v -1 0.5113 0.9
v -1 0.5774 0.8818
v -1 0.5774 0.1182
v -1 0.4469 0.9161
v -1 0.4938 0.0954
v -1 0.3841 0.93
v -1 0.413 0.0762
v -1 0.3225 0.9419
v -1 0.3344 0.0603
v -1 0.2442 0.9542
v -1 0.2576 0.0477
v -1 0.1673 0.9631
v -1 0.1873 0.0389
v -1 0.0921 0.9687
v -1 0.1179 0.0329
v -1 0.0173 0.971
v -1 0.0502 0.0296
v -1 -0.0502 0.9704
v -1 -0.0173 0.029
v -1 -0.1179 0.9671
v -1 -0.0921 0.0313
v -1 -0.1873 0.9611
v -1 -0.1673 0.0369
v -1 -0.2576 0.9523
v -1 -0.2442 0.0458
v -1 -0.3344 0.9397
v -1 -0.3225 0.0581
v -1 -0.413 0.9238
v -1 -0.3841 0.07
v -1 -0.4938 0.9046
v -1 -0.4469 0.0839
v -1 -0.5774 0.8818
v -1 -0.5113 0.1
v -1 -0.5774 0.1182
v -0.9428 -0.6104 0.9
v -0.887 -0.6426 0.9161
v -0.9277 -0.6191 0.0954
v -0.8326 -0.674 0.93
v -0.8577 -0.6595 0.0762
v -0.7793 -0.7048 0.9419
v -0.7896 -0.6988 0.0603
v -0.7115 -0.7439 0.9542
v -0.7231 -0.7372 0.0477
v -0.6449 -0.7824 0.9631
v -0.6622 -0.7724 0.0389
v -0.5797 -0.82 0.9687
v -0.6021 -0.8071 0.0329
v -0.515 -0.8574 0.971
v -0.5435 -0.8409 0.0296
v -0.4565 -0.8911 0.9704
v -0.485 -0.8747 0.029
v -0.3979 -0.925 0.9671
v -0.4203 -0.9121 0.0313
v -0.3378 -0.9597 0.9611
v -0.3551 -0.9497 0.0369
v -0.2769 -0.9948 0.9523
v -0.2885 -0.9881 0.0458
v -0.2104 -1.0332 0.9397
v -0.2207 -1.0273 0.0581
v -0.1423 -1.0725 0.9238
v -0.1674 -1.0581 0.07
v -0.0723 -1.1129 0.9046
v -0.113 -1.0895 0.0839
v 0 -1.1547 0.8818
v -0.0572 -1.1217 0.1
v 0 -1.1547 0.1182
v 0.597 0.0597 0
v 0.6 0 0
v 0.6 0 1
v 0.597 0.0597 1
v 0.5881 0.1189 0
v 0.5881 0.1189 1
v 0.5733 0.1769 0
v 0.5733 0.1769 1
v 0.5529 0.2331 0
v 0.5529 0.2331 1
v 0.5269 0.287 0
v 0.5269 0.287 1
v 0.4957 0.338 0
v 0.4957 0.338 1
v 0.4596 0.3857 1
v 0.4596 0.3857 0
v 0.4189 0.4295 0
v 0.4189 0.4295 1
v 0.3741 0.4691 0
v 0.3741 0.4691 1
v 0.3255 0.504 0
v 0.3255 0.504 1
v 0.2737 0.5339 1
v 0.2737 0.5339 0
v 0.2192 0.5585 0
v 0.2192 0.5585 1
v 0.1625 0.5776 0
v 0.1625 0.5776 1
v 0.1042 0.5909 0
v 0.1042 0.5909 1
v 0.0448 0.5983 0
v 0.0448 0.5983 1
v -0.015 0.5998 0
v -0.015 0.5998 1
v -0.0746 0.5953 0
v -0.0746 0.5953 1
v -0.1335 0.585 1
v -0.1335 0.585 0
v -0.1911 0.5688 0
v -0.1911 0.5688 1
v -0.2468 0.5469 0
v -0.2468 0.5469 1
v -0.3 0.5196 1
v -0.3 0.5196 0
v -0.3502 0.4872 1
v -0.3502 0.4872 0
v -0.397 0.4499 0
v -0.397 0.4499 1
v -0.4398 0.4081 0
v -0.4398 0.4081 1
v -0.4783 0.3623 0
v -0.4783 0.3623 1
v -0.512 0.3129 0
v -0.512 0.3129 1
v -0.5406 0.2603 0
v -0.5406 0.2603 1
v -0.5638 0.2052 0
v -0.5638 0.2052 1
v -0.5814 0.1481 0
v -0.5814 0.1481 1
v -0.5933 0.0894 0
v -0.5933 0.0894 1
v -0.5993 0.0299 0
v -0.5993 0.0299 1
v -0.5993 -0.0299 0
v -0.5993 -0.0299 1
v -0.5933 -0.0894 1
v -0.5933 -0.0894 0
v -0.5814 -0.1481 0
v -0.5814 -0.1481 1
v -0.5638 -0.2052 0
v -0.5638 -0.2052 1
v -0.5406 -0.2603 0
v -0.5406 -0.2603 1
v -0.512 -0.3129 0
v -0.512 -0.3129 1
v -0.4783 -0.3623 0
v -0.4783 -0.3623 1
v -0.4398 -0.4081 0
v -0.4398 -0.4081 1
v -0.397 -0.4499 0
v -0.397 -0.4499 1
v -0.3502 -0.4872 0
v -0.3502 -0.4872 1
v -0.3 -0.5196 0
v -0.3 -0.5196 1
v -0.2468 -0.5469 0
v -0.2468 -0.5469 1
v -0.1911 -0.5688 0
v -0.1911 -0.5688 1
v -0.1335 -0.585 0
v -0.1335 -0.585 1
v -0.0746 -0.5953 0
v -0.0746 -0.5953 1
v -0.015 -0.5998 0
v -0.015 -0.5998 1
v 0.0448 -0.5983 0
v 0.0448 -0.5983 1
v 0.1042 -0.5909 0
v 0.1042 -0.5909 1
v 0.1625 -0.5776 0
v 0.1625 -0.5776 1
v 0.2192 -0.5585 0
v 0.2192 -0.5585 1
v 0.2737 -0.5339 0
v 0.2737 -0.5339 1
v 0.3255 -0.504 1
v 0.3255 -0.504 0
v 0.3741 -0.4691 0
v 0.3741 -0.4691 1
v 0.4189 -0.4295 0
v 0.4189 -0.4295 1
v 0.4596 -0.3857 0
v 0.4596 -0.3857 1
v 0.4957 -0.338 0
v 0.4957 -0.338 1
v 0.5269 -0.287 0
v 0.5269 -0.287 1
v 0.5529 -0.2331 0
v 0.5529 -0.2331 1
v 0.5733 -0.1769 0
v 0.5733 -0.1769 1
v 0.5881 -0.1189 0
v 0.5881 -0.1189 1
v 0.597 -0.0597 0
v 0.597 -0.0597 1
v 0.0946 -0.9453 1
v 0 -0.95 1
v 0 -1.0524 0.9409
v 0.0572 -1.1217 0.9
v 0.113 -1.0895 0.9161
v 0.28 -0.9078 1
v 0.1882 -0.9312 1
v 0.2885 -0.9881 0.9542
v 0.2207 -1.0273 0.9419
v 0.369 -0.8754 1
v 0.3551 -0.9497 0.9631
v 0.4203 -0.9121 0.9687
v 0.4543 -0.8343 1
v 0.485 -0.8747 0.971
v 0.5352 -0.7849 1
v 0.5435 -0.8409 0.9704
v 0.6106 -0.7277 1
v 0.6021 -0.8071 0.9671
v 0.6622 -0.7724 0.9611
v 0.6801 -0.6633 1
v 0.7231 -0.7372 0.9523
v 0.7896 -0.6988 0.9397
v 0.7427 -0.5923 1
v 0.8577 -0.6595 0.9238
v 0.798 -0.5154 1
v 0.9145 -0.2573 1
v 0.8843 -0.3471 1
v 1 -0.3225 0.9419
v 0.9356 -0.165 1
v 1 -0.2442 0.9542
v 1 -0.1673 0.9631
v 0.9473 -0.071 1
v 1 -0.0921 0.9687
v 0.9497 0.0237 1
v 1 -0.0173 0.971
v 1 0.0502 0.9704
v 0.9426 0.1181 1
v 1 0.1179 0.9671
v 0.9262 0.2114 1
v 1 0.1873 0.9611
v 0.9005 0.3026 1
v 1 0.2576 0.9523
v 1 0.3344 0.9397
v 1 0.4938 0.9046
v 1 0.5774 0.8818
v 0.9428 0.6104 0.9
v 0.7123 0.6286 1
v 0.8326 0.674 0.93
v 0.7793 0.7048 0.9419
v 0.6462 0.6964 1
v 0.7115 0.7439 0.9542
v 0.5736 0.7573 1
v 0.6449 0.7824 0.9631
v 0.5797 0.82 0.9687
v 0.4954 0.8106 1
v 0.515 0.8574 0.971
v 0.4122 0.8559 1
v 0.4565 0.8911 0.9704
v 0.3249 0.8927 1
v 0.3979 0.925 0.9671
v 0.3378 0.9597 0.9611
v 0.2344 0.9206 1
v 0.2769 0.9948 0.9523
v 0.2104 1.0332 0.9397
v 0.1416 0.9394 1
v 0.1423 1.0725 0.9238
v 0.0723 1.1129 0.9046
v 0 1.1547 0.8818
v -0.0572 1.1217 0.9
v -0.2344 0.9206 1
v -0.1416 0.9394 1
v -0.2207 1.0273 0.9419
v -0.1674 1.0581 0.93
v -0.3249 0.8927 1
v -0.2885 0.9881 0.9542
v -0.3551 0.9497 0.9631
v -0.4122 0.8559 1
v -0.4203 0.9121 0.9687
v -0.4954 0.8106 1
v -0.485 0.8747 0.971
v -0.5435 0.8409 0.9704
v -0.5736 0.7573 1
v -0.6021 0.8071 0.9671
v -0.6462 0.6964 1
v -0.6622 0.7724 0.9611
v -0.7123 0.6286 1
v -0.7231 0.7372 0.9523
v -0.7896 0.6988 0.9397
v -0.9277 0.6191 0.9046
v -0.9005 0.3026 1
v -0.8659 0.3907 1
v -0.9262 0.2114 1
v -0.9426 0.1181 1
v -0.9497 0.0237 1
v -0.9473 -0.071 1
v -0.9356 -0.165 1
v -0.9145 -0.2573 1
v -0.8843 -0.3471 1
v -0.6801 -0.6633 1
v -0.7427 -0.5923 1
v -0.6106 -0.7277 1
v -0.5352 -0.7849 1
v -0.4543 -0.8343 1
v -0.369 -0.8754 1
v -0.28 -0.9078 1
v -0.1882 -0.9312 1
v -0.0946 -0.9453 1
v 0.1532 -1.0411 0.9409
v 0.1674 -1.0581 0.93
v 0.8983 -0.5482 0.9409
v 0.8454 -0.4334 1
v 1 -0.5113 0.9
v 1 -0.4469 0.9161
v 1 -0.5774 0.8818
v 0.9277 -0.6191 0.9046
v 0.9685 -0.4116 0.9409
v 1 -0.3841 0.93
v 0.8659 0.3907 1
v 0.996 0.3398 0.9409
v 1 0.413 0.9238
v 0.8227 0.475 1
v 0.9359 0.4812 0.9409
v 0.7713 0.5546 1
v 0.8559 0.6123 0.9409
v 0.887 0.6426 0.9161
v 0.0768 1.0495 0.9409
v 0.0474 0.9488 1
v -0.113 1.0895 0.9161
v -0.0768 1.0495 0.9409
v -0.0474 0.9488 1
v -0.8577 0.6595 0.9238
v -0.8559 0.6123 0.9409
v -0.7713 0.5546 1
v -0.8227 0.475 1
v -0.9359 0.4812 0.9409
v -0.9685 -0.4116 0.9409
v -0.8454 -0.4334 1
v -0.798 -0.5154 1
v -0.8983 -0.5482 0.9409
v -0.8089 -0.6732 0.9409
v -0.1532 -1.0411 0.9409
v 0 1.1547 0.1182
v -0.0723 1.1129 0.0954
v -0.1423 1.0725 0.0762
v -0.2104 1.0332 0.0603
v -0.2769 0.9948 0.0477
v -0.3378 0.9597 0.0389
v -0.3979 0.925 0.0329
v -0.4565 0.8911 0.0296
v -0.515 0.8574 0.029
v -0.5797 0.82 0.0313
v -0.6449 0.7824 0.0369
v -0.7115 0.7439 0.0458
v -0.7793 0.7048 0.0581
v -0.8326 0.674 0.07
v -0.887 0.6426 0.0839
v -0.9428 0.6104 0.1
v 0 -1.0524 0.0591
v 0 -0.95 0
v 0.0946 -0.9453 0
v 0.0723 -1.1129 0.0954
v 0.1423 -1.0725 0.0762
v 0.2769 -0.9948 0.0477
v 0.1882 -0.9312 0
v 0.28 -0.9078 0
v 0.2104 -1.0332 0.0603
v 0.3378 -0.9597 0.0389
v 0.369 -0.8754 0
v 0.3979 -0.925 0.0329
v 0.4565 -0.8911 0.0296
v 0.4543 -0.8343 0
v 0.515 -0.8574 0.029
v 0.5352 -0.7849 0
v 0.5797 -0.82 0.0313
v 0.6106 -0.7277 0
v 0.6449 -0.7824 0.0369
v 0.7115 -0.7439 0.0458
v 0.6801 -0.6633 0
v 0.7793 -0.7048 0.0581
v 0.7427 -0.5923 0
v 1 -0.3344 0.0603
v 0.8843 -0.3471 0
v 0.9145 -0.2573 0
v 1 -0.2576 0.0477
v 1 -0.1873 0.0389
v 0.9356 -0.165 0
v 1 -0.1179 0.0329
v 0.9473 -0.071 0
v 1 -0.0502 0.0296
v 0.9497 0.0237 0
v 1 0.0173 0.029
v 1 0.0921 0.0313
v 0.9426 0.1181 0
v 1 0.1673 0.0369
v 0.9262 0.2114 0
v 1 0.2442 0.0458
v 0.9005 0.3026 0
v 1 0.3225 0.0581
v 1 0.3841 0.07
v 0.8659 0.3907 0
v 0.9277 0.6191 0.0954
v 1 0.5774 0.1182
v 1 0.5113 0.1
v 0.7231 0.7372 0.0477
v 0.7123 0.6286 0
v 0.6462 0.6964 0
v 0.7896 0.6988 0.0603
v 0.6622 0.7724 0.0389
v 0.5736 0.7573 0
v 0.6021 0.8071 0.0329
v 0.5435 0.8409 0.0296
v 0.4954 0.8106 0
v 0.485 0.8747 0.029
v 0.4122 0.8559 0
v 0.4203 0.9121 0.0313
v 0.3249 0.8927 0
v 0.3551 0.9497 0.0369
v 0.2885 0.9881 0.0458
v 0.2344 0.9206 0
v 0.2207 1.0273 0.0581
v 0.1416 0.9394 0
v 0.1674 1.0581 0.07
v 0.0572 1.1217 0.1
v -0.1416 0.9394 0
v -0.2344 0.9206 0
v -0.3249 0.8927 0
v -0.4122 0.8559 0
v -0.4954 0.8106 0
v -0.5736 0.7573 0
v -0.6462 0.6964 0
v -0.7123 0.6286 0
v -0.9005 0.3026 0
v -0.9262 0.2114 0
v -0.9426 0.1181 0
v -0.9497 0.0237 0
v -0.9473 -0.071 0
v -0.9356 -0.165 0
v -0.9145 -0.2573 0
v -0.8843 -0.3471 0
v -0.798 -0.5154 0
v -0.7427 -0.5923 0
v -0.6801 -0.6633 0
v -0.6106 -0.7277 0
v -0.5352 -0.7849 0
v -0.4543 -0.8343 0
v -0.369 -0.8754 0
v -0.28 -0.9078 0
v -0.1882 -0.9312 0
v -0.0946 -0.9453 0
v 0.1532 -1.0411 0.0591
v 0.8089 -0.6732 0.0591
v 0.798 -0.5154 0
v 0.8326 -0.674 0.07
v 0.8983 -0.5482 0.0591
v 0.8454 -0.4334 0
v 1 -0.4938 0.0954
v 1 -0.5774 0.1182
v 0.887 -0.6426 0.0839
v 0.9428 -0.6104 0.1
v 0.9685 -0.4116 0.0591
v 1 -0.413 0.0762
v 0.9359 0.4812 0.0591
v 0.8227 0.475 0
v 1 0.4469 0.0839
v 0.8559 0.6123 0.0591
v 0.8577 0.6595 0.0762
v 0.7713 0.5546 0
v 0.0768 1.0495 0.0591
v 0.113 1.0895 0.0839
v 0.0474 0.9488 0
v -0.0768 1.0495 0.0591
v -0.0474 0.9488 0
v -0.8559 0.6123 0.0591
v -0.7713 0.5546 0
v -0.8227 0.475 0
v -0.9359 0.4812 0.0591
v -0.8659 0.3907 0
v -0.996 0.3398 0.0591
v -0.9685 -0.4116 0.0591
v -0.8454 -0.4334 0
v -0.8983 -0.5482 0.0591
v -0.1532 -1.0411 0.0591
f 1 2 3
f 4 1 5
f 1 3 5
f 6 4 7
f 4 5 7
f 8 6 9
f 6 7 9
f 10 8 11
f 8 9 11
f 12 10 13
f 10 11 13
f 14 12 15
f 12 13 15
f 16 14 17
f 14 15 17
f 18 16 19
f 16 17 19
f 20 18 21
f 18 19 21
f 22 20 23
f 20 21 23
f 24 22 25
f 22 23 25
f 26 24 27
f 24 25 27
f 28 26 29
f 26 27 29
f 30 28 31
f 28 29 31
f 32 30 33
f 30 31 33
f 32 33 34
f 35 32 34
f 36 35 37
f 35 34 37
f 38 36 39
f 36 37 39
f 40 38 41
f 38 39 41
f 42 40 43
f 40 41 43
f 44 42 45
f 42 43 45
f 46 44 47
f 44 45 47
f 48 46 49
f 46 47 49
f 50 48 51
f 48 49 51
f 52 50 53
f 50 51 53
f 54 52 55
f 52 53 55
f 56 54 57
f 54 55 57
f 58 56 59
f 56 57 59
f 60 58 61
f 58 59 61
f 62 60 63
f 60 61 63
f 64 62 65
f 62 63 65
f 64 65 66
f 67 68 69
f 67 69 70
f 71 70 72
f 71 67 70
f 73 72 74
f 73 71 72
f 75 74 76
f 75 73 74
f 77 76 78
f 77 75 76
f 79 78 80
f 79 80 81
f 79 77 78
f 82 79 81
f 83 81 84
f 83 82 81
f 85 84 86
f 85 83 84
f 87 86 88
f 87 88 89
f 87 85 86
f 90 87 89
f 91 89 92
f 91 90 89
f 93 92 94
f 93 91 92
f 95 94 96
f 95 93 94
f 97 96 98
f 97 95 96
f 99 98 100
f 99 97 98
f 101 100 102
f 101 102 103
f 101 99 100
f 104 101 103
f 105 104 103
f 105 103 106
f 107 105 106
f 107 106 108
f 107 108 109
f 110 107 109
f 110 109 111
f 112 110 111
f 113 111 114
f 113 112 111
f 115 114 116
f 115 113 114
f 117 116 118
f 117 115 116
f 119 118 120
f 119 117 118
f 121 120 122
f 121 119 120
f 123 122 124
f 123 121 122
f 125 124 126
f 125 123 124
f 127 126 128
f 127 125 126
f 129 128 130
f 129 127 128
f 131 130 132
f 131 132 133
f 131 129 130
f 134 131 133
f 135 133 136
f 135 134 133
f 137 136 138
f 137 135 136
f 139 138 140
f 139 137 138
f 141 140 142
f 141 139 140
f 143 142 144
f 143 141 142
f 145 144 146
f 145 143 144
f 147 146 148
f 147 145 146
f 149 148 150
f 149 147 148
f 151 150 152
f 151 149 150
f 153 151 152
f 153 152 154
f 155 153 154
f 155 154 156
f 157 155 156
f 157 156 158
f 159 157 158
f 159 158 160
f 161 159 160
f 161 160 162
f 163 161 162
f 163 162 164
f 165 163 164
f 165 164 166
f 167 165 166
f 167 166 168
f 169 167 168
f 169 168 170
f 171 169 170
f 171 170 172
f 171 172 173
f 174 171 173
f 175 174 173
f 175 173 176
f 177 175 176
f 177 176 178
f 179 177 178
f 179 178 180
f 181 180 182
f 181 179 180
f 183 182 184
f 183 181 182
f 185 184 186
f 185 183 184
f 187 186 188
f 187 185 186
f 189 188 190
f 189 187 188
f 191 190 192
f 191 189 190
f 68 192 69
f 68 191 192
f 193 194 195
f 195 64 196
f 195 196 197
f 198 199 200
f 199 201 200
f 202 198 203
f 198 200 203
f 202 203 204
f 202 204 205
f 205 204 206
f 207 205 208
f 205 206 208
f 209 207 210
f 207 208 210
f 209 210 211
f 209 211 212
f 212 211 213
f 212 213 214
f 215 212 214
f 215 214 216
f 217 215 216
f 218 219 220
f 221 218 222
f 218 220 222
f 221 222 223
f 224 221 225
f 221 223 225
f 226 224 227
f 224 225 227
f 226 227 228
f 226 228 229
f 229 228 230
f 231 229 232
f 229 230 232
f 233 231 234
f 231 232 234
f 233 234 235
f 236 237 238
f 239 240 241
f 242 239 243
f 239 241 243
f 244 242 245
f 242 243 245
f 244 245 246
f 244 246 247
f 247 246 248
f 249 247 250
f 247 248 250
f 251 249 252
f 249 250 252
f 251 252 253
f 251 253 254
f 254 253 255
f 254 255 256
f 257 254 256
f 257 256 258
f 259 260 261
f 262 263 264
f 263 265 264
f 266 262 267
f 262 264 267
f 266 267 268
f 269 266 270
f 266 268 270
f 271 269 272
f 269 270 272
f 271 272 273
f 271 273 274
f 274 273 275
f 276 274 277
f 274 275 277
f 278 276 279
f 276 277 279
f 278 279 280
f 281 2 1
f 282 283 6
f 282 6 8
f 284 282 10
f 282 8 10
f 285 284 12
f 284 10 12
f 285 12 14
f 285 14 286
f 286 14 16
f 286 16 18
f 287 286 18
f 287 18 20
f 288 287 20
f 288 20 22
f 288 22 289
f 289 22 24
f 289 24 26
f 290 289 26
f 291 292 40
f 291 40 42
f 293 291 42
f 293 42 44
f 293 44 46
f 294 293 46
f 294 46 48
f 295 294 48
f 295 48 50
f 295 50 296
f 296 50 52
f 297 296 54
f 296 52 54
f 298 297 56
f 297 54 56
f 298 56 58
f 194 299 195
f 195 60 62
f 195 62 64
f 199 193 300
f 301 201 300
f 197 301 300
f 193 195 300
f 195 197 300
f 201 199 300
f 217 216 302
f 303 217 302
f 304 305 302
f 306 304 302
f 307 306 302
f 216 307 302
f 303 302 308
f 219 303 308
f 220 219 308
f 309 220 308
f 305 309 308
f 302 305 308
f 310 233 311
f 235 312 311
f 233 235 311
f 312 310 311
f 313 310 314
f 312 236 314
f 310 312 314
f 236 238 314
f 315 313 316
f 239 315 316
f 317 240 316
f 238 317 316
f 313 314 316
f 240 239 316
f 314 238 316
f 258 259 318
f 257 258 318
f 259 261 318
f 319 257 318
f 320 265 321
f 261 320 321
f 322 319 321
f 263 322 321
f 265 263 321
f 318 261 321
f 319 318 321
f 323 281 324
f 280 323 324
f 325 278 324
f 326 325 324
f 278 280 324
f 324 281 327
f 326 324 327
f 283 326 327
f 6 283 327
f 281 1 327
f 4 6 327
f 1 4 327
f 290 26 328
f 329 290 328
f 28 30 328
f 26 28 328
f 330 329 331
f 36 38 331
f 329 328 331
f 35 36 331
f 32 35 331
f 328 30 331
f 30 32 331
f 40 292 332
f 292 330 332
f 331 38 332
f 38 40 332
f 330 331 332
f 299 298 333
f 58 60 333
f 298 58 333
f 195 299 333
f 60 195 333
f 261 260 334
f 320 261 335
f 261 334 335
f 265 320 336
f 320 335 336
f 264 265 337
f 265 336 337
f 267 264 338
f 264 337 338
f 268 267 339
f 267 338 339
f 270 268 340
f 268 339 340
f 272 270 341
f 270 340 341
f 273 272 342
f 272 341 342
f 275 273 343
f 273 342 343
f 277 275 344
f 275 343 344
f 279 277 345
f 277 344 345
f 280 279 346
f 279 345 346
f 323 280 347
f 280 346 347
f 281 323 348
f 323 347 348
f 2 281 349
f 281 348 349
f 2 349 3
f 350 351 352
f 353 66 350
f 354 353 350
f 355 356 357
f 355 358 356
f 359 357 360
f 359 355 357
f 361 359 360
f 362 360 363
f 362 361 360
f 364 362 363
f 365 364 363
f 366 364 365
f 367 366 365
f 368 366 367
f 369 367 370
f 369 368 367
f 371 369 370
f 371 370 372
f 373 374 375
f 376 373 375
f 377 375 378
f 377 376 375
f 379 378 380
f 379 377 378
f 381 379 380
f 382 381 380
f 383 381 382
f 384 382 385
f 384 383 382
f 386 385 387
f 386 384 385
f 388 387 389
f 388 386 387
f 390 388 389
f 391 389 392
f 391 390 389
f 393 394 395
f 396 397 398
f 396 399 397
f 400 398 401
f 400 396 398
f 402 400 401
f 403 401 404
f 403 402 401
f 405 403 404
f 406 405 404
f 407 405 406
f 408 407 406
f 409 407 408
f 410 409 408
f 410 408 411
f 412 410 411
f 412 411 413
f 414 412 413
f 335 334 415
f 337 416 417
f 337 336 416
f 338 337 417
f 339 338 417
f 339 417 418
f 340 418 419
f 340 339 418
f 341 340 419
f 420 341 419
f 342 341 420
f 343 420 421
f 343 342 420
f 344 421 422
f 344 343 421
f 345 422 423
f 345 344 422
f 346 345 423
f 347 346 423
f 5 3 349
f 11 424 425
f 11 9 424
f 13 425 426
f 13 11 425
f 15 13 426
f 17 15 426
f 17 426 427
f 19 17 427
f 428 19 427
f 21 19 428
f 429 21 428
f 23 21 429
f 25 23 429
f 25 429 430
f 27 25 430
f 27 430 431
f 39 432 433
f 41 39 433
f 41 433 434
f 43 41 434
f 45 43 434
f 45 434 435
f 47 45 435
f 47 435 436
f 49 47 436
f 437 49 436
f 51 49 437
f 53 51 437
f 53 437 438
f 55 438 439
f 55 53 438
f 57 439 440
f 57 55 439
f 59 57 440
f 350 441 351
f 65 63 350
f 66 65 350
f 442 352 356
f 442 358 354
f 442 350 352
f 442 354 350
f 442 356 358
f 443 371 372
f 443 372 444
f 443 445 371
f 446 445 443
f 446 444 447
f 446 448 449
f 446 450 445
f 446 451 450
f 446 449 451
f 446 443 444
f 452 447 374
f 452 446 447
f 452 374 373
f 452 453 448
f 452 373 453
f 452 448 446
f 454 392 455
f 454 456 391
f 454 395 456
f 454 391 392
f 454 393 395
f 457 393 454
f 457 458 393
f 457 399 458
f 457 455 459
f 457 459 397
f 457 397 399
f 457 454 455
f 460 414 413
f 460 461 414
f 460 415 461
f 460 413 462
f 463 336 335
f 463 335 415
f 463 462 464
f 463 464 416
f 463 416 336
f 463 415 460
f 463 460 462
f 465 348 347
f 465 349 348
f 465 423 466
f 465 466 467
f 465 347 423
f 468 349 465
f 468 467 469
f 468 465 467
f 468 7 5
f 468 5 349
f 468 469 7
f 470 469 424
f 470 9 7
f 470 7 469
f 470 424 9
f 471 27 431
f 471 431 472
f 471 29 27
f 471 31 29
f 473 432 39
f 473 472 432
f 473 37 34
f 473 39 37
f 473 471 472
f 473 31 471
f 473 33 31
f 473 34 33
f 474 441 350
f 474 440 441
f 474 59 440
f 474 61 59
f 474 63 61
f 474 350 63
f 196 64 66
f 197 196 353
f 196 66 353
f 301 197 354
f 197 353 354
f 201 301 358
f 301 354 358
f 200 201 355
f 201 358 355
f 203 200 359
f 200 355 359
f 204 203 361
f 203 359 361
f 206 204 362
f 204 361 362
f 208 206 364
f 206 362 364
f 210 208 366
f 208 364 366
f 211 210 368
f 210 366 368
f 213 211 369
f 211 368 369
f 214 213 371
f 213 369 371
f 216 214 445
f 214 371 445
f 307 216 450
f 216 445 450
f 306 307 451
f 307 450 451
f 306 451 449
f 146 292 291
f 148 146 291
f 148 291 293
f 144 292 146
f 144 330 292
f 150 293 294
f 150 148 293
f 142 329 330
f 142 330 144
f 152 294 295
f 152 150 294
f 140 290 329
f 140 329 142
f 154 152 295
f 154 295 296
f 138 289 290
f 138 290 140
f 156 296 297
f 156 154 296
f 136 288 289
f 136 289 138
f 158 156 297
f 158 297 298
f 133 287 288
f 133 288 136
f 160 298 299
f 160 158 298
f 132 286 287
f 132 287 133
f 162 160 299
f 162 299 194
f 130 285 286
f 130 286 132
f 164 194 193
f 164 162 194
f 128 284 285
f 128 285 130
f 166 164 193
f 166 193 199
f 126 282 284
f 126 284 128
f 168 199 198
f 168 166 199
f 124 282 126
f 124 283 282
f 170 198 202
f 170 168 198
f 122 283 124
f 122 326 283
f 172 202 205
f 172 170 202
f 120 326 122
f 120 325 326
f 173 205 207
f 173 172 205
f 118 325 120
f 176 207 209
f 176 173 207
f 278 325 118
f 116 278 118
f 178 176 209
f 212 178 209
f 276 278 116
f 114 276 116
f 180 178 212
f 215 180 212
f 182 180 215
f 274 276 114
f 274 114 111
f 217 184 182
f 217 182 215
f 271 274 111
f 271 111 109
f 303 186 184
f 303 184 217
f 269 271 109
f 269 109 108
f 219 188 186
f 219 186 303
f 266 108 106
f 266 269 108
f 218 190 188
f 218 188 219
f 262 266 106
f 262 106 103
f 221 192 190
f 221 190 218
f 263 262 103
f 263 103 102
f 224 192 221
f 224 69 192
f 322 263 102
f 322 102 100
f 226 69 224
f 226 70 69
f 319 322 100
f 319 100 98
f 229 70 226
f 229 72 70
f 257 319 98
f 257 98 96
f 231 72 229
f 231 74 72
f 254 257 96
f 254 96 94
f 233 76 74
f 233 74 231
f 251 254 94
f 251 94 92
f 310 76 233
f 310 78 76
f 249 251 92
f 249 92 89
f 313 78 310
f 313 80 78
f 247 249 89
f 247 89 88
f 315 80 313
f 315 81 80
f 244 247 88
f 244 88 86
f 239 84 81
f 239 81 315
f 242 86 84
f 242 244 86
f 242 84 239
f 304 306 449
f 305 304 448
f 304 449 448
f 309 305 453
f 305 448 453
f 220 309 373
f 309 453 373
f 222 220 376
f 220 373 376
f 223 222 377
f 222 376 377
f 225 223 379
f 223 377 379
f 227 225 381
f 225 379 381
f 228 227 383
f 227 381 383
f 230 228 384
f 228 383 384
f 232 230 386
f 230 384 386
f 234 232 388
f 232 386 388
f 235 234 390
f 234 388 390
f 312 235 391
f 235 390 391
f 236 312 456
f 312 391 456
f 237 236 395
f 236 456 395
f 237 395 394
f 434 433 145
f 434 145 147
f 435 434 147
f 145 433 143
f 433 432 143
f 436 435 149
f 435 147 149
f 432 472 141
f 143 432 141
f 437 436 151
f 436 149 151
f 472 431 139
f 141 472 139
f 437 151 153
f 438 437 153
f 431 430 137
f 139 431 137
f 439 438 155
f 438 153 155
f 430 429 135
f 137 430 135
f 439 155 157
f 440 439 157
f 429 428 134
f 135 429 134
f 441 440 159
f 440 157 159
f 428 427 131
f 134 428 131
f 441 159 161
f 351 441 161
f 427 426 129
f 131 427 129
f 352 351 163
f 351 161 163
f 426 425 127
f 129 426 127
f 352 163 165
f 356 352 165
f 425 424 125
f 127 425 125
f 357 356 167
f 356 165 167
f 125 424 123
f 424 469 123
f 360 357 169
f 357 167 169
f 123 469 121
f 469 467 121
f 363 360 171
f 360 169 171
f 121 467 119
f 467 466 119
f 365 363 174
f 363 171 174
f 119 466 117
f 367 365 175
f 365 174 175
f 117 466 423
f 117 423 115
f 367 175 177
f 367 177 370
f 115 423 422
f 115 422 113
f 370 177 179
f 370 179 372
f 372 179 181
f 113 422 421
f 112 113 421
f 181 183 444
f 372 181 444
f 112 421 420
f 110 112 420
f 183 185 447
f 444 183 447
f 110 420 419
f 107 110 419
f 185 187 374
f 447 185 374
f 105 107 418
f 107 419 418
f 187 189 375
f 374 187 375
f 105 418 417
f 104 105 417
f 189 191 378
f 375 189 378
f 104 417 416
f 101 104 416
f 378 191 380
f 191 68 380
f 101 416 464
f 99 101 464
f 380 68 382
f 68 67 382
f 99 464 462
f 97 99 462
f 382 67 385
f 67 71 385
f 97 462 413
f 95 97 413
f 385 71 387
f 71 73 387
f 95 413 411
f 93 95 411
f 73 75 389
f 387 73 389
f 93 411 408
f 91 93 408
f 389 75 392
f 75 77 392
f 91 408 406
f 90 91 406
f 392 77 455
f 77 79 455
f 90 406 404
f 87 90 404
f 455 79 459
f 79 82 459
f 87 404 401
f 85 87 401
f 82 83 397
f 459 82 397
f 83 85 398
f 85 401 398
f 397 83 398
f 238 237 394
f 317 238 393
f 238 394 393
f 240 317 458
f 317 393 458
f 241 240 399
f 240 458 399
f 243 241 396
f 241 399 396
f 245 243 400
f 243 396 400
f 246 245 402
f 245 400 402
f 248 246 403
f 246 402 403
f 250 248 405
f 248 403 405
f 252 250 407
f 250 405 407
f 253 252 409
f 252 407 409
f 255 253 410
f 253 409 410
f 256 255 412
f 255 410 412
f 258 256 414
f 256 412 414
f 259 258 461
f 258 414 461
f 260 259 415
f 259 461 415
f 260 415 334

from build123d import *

# Parameters (mm, degrees)
SKETCH_1_R      = 0.6
EXTRUDE_1_DEPTH = 1


with BuildPart() as part:
    # Эскиз1 → Бобышка-Вытянуть1 (new body)
    with BuildSketch(Plane.XY):
        Polygon((0, 1.154700538), (-1, 0.577350269), (-1, -0.577350269), (0, -1.154700538), (1, -0.577350269), (1, 0.577350269), align=None)
        Circle(SKETCH_1_R, mode=Mode.SUBTRACT)
    extrude(amount=EXTRUDE_1_DEPTH)

    # Эскиз2 → Вырез-Повернуть1 (revolve, cut)
    with BuildSketch(Plane(origin=(0, 0, 0), x_dir=(0, 0, -1), z_dir=(1, 0, 0)), mode=Mode.PRIVATE) as cut_revolve_1_sk:
        Polygon((-1, 1.329278221), (-1, 0.95), (-0.781023617, 1.329278221), align=None)
        Polygon((0, 1.329278221), (0, 0.95), (-0.218976383, 1.329278221), align=None)
    revolve(cut_revolve_1_sk.sketch.rotate(Axis((0, 0, 0), (0, 0, 1)), 180), axis=Axis((0, 0, 0), (0, 0, 1)), mode=Mode.SUBTRACT)


solid = part.part
